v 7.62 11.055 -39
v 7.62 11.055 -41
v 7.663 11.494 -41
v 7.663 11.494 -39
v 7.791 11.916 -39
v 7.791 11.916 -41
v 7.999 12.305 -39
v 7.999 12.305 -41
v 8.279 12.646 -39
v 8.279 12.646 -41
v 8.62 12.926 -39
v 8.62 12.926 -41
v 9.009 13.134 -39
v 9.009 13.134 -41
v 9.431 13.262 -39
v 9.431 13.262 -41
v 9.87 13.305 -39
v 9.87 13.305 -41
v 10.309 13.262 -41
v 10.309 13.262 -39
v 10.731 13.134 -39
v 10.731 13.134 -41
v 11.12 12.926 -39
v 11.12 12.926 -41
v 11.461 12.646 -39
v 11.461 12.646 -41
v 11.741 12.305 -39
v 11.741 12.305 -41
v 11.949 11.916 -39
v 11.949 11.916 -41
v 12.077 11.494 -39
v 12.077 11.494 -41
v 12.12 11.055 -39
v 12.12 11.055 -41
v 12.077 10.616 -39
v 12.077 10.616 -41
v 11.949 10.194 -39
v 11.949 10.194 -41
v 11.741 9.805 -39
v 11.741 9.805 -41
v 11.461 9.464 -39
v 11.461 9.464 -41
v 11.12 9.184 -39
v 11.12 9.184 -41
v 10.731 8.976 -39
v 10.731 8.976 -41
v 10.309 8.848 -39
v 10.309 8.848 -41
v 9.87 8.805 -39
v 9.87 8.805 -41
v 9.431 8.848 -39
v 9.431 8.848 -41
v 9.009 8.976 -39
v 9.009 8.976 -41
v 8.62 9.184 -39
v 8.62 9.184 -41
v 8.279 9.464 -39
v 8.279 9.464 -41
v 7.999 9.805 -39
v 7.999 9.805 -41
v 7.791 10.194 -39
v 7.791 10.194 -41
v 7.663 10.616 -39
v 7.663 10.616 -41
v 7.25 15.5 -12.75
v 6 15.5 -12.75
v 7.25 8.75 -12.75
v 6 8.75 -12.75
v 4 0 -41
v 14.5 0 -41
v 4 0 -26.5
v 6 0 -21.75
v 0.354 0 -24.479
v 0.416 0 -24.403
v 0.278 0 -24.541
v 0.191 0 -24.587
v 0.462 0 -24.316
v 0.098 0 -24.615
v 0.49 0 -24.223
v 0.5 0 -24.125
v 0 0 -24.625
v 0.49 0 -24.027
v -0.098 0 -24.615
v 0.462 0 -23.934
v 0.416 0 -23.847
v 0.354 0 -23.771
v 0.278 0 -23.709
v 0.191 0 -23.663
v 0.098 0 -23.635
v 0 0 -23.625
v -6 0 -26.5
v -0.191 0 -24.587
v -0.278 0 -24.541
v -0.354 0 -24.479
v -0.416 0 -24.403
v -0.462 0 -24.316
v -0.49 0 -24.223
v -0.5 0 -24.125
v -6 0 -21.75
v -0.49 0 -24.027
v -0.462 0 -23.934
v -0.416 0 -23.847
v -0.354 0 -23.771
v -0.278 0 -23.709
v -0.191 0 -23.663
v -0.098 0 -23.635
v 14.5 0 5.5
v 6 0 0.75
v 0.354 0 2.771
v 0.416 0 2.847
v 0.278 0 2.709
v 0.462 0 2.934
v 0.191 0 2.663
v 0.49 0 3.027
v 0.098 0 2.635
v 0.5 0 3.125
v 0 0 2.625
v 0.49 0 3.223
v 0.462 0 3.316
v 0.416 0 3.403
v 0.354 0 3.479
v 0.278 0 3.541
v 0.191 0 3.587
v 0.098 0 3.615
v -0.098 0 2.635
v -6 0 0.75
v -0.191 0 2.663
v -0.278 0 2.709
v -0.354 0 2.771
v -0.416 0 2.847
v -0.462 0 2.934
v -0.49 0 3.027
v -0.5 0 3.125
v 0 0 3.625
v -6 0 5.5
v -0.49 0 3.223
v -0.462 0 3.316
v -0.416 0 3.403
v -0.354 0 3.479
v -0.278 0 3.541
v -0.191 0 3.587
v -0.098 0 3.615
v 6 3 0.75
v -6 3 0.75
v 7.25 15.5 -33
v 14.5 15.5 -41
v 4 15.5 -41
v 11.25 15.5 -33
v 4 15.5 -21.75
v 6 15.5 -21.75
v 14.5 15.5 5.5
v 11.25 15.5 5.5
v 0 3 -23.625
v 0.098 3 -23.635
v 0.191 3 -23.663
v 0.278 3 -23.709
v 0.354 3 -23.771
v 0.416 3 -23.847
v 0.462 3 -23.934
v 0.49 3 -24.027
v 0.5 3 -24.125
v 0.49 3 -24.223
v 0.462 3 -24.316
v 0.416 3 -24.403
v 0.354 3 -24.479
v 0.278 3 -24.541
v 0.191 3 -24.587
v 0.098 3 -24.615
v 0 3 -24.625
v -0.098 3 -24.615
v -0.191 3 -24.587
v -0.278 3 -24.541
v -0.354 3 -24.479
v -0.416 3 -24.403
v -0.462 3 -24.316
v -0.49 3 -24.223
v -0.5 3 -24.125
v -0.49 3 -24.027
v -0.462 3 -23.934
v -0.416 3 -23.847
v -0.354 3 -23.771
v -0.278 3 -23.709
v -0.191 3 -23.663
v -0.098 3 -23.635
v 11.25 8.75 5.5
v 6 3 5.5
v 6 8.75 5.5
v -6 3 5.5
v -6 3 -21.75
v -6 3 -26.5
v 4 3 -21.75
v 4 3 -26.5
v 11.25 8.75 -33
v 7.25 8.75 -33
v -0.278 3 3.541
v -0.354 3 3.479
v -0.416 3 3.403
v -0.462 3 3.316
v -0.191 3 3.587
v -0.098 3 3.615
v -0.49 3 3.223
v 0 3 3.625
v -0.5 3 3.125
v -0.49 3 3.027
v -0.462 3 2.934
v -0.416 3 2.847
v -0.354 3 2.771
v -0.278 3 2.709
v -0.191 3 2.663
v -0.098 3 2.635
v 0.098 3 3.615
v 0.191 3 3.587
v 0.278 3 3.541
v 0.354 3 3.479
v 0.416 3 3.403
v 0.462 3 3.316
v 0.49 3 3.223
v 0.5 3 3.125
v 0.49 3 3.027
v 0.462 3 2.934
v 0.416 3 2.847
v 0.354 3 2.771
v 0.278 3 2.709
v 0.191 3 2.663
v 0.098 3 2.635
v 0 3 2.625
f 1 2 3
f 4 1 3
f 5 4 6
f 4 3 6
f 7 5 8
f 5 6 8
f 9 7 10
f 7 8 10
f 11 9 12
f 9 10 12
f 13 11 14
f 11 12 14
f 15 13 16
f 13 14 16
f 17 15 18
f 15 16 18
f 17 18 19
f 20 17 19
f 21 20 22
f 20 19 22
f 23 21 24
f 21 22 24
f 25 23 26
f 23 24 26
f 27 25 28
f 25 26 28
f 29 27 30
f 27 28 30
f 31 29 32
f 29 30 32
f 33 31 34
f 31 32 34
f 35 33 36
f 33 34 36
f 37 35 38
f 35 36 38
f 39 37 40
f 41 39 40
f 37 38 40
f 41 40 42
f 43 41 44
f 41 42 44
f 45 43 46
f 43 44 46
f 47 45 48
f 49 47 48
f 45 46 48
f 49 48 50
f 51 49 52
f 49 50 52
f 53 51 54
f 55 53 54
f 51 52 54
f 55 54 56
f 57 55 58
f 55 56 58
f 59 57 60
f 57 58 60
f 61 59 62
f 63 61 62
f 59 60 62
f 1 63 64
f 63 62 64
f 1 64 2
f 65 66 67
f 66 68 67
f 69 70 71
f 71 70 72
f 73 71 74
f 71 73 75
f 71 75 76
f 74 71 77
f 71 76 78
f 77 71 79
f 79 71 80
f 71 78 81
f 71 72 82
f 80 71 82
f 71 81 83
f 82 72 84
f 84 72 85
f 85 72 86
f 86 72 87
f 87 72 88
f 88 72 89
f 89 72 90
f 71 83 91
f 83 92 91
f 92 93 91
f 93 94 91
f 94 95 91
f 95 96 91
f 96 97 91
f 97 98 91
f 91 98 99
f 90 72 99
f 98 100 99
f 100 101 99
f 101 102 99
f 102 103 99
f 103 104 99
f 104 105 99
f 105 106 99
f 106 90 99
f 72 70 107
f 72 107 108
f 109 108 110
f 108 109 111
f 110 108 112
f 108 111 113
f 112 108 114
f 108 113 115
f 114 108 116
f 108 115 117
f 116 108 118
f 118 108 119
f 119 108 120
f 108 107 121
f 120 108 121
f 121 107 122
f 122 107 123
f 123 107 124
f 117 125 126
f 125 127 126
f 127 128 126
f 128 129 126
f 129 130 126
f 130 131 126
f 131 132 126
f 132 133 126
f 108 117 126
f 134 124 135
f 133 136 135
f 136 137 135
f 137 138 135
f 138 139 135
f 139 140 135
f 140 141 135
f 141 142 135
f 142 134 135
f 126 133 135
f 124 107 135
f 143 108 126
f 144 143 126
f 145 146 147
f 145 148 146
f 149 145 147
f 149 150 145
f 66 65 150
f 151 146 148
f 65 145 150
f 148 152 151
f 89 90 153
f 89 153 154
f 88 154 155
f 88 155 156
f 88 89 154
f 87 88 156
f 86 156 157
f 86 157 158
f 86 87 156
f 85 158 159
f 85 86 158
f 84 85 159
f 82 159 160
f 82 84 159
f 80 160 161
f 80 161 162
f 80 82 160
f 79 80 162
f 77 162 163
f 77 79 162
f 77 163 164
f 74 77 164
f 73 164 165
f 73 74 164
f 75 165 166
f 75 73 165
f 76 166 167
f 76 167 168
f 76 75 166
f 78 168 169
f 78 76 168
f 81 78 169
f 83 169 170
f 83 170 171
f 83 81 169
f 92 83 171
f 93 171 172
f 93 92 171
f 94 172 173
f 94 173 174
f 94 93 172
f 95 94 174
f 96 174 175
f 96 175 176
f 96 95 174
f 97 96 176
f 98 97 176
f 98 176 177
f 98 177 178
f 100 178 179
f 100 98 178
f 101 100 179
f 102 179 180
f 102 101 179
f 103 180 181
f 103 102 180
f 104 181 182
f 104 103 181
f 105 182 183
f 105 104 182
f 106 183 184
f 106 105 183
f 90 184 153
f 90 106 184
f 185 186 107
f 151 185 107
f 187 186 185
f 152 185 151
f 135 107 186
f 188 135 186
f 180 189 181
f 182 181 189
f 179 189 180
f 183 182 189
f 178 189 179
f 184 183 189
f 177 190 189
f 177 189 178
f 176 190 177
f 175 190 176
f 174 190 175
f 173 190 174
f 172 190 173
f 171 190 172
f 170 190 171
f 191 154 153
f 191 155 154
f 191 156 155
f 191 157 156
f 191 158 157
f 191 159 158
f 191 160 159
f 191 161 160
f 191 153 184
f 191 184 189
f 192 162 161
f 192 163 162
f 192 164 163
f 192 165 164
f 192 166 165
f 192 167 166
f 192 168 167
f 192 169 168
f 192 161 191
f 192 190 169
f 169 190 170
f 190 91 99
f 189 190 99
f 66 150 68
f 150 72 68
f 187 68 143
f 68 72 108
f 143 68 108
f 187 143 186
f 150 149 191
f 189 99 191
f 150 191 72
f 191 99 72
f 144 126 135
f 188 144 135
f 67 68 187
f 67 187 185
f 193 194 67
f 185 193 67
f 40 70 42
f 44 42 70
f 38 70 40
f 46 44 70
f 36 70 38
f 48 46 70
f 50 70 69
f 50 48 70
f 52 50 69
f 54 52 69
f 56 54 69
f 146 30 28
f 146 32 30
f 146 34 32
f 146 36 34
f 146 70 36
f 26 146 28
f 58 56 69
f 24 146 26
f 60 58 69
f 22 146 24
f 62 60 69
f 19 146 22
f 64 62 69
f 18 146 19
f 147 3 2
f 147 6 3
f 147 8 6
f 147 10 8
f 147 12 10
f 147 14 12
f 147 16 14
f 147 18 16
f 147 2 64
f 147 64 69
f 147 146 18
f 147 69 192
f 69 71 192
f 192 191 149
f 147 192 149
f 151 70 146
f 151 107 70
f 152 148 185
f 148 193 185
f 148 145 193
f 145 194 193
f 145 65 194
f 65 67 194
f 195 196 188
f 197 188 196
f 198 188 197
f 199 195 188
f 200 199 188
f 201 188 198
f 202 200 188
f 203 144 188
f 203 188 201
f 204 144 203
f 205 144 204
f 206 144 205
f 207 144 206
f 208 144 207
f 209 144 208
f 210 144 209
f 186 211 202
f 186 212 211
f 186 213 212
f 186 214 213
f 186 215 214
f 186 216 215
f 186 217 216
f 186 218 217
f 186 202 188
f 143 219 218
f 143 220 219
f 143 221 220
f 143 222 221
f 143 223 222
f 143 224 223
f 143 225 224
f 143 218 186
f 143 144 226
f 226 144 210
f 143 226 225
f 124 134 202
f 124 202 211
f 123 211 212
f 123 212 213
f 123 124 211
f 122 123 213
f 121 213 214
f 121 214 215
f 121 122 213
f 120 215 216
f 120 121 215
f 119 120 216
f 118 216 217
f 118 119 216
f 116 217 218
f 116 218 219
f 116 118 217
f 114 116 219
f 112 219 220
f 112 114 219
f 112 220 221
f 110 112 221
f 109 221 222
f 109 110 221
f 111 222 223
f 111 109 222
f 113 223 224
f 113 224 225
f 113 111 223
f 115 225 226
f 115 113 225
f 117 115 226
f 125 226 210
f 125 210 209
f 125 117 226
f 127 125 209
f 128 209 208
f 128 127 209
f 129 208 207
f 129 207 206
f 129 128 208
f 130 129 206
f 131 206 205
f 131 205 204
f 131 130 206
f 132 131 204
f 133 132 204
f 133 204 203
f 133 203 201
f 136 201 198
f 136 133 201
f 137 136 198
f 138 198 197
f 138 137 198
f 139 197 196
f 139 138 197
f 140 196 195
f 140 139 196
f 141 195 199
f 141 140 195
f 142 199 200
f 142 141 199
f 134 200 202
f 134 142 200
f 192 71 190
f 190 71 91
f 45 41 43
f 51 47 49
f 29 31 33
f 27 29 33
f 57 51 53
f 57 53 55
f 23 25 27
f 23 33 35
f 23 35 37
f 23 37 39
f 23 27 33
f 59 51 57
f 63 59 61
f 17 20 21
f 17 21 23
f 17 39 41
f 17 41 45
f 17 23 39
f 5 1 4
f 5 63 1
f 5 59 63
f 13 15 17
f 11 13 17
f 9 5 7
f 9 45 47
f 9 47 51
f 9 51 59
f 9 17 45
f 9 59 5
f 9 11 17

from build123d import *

# Parameters (mm, degrees)
CROQUIS1_R               = 0.5
SALIENTE_EXTRUIR1_DEPTH  = 3
SALIENTE_EXTRUIR2_DEPTH  = 11
SALIENTE_EXTRUIR3_DEPTH  = 5.75
CROQUIS4_R               = 2
CROQUIS4_R_2             = 1
CORTAR_EXTRUIR1_DEPTH    = 4
SALIENTE_EXTRUIR5_START  = 4
CROQUIS6_R               = 2
CROQUIS6_R_2             = 1
SALIENTE_EXTRUIR5_DEPTH  = 4
SALIENTE_EXTRUIR6_DEPTH  = 1.5
CROQUIS9_W               = 44.5
CROQUIS9_H               = 15.5
SALIENTE_EXTRUIR7_DEPTH  = 1
CROQUIS11_W              = 10.5
CROQUIS11_H              = 15.5
SALIENTE_EXTRUIR10_DEPTH = 2
CROQUIS7_R               = 2.25
CORTAR_EXTRUIR2_DEPTH    = 2


with BuildPart() as part:
    # Croquis1 → Saliente-Extruir1 (new body)
    with BuildSketch(Plane(origin=(0, 0, 0), x_dir=(1, 0, 0), z_dir=(0, 1, 0))):
        Polygon((-6, -0.75), (-6, -5.5), (4, -5.5), (13.5, -5.5), (13.5, 26.5), (13.5, 39), (4, 39), (4, 26.5), (-6, 26.5), (-6, 21.75), (4, 21.75), (6, 21.75), (6, 11.25), (6, -0.75), align=None)
        with Locations(Location((0, -3.125, 0), (0, 0, 270))):
            Circle(CROQUIS1_R, mode=Mode.SUBTRACT)
        with Locations(Location((0, 24.125, 0), (0, 0, 270))):
            Circle(CROQUIS1_R, mode=Mode.SUBTRACT)
    extrude(amount=SALIENTE_EXTRUIR1_DEPTH)

    # Croquis2 → Saliente-Extruir2 (add)
    with BuildSketch(Plane(origin=(0, 3, 0), x_dir=(1, 0, 0), z_dir=(0, 1, 0))):
        Polygon((11.25, -5.5), (13.5, -5.5), (13.5, 26.5), (13.5, 39), (4, 39), (4, 26.5), (4, 21.75), (6, 21.75), (6, 12.75), (7.25, 12.75), (7.25, 33), (11.25, 33), align=None)
    extrude(amount=SALIENTE_EXTRUIR2_DEPTH)

    # Croquis3 → Saliente-Extruir3 (add)
    with BuildSketch(Plane(origin=(0, 3, 0), x_dir=(1, 0, 0), z_dir=(0, 1, 0))):
        Polygon((11.25, -5.5), (11.25, 33), (7.25, 33), (7.25, 12.75), (6, 12.75), (6, -5.5), align=None)
    extrude(amount=SALIENTE_EXTRUIR3_DEPTH)

    # Croquis4 → Cortar-Extruir1 (cut)
    with BuildSketch(Plane(origin=(0, 0, -39), x_dir=(-1, 0, 0), z_dir=(0, 0, -1))):
        with Locations((-9.87, 11.055)):
            Circle(CROQUIS4_R)
        with Locations((-9.87, 5.555)):
            Circle(CROQUIS4_R_2)
        with Locations((-9.87, 2.055)):
            Circle(CROQUIS4_R_2)
    extrude(amount=-CORTAR_EXTRUIR1_DEPTH, mode=Mode.SUBTRACT)

    # Croquis6 → Saliente-Extruir5 (add)
    with BuildSketch(Plane(origin=(0, 0, -35), x_dir=(-1, 0, 0), z_dir=(0, 0, -1)).offset(SALIENTE_EXTRUIR5_START)):
        with Locations((-9.87, 11.055)):
            Circle(CROQUIS6_R)
        with Locations((-9.87, 5.555)):
            Circle(CROQUIS6_R_2)
        with Locations((-9.87, 2.055)):
            Circle(CROQUIS6_R_2)
    extrude(amount=-SALIENTE_EXTRUIR5_DEPTH)

    # Croquis8 → Saliente-Extruir6 (add)
    with BuildSketch(Plane(origin=(0, 14, 0), x_dir=(1, 0, 0), z_dir=(0, 1, 0))):
        Polygon((4, 39), (4, 21.75), (6, 21.75), (6, 12.75), (7.25, 12.75), (7.25, 33), (11.25, 33), (11.25, -5.5), (13.5, -5.5), (13.5, 39), align=None)
    extrude(amount=SALIENTE_EXTRUIR6_DEPTH)

    # Croquis9 → Saliente-Extruir7 (add)
    with BuildSketch(Plane(origin=(13.5, 0, 0), x_dir=(0, 0, -1), z_dir=(1, 0, 0))):
        with Locations((16.75, 7.75)):
            Rectangle(CROQUIS9_W, CROQUIS9_H)
    extrude(amount=SALIENTE_EXTRUIR7_DEPTH)

    # Croquis11 → Saliente-Extruir10 (add)
    with BuildSketch(Plane(origin=(0, 0, -39), x_dir=(-1, 0, 0), z_dir=(0, 0, -1))):
        with Locations((-9.25, 7.75)):
            Rectangle(CROQUIS11_W, CROQUIS11_H)
    extrude(amount=SALIENTE_EXTRUIR10_DEPTH)

    # Croquis7 → Cortar-Extruir2 (cut)
    with BuildSketch(Plane(origin=(0, 0, -41), x_dir=(-1, 0, 0), z_dir=(0, 0, -1))):
        with Locations((-9.87, 11.055)):
            Circle(CROQUIS7_R)
    extrude(amount=-CORTAR_EXTRUIR2_DEPTH, mode=Mode.SUBTRACT)


solid = part.part
